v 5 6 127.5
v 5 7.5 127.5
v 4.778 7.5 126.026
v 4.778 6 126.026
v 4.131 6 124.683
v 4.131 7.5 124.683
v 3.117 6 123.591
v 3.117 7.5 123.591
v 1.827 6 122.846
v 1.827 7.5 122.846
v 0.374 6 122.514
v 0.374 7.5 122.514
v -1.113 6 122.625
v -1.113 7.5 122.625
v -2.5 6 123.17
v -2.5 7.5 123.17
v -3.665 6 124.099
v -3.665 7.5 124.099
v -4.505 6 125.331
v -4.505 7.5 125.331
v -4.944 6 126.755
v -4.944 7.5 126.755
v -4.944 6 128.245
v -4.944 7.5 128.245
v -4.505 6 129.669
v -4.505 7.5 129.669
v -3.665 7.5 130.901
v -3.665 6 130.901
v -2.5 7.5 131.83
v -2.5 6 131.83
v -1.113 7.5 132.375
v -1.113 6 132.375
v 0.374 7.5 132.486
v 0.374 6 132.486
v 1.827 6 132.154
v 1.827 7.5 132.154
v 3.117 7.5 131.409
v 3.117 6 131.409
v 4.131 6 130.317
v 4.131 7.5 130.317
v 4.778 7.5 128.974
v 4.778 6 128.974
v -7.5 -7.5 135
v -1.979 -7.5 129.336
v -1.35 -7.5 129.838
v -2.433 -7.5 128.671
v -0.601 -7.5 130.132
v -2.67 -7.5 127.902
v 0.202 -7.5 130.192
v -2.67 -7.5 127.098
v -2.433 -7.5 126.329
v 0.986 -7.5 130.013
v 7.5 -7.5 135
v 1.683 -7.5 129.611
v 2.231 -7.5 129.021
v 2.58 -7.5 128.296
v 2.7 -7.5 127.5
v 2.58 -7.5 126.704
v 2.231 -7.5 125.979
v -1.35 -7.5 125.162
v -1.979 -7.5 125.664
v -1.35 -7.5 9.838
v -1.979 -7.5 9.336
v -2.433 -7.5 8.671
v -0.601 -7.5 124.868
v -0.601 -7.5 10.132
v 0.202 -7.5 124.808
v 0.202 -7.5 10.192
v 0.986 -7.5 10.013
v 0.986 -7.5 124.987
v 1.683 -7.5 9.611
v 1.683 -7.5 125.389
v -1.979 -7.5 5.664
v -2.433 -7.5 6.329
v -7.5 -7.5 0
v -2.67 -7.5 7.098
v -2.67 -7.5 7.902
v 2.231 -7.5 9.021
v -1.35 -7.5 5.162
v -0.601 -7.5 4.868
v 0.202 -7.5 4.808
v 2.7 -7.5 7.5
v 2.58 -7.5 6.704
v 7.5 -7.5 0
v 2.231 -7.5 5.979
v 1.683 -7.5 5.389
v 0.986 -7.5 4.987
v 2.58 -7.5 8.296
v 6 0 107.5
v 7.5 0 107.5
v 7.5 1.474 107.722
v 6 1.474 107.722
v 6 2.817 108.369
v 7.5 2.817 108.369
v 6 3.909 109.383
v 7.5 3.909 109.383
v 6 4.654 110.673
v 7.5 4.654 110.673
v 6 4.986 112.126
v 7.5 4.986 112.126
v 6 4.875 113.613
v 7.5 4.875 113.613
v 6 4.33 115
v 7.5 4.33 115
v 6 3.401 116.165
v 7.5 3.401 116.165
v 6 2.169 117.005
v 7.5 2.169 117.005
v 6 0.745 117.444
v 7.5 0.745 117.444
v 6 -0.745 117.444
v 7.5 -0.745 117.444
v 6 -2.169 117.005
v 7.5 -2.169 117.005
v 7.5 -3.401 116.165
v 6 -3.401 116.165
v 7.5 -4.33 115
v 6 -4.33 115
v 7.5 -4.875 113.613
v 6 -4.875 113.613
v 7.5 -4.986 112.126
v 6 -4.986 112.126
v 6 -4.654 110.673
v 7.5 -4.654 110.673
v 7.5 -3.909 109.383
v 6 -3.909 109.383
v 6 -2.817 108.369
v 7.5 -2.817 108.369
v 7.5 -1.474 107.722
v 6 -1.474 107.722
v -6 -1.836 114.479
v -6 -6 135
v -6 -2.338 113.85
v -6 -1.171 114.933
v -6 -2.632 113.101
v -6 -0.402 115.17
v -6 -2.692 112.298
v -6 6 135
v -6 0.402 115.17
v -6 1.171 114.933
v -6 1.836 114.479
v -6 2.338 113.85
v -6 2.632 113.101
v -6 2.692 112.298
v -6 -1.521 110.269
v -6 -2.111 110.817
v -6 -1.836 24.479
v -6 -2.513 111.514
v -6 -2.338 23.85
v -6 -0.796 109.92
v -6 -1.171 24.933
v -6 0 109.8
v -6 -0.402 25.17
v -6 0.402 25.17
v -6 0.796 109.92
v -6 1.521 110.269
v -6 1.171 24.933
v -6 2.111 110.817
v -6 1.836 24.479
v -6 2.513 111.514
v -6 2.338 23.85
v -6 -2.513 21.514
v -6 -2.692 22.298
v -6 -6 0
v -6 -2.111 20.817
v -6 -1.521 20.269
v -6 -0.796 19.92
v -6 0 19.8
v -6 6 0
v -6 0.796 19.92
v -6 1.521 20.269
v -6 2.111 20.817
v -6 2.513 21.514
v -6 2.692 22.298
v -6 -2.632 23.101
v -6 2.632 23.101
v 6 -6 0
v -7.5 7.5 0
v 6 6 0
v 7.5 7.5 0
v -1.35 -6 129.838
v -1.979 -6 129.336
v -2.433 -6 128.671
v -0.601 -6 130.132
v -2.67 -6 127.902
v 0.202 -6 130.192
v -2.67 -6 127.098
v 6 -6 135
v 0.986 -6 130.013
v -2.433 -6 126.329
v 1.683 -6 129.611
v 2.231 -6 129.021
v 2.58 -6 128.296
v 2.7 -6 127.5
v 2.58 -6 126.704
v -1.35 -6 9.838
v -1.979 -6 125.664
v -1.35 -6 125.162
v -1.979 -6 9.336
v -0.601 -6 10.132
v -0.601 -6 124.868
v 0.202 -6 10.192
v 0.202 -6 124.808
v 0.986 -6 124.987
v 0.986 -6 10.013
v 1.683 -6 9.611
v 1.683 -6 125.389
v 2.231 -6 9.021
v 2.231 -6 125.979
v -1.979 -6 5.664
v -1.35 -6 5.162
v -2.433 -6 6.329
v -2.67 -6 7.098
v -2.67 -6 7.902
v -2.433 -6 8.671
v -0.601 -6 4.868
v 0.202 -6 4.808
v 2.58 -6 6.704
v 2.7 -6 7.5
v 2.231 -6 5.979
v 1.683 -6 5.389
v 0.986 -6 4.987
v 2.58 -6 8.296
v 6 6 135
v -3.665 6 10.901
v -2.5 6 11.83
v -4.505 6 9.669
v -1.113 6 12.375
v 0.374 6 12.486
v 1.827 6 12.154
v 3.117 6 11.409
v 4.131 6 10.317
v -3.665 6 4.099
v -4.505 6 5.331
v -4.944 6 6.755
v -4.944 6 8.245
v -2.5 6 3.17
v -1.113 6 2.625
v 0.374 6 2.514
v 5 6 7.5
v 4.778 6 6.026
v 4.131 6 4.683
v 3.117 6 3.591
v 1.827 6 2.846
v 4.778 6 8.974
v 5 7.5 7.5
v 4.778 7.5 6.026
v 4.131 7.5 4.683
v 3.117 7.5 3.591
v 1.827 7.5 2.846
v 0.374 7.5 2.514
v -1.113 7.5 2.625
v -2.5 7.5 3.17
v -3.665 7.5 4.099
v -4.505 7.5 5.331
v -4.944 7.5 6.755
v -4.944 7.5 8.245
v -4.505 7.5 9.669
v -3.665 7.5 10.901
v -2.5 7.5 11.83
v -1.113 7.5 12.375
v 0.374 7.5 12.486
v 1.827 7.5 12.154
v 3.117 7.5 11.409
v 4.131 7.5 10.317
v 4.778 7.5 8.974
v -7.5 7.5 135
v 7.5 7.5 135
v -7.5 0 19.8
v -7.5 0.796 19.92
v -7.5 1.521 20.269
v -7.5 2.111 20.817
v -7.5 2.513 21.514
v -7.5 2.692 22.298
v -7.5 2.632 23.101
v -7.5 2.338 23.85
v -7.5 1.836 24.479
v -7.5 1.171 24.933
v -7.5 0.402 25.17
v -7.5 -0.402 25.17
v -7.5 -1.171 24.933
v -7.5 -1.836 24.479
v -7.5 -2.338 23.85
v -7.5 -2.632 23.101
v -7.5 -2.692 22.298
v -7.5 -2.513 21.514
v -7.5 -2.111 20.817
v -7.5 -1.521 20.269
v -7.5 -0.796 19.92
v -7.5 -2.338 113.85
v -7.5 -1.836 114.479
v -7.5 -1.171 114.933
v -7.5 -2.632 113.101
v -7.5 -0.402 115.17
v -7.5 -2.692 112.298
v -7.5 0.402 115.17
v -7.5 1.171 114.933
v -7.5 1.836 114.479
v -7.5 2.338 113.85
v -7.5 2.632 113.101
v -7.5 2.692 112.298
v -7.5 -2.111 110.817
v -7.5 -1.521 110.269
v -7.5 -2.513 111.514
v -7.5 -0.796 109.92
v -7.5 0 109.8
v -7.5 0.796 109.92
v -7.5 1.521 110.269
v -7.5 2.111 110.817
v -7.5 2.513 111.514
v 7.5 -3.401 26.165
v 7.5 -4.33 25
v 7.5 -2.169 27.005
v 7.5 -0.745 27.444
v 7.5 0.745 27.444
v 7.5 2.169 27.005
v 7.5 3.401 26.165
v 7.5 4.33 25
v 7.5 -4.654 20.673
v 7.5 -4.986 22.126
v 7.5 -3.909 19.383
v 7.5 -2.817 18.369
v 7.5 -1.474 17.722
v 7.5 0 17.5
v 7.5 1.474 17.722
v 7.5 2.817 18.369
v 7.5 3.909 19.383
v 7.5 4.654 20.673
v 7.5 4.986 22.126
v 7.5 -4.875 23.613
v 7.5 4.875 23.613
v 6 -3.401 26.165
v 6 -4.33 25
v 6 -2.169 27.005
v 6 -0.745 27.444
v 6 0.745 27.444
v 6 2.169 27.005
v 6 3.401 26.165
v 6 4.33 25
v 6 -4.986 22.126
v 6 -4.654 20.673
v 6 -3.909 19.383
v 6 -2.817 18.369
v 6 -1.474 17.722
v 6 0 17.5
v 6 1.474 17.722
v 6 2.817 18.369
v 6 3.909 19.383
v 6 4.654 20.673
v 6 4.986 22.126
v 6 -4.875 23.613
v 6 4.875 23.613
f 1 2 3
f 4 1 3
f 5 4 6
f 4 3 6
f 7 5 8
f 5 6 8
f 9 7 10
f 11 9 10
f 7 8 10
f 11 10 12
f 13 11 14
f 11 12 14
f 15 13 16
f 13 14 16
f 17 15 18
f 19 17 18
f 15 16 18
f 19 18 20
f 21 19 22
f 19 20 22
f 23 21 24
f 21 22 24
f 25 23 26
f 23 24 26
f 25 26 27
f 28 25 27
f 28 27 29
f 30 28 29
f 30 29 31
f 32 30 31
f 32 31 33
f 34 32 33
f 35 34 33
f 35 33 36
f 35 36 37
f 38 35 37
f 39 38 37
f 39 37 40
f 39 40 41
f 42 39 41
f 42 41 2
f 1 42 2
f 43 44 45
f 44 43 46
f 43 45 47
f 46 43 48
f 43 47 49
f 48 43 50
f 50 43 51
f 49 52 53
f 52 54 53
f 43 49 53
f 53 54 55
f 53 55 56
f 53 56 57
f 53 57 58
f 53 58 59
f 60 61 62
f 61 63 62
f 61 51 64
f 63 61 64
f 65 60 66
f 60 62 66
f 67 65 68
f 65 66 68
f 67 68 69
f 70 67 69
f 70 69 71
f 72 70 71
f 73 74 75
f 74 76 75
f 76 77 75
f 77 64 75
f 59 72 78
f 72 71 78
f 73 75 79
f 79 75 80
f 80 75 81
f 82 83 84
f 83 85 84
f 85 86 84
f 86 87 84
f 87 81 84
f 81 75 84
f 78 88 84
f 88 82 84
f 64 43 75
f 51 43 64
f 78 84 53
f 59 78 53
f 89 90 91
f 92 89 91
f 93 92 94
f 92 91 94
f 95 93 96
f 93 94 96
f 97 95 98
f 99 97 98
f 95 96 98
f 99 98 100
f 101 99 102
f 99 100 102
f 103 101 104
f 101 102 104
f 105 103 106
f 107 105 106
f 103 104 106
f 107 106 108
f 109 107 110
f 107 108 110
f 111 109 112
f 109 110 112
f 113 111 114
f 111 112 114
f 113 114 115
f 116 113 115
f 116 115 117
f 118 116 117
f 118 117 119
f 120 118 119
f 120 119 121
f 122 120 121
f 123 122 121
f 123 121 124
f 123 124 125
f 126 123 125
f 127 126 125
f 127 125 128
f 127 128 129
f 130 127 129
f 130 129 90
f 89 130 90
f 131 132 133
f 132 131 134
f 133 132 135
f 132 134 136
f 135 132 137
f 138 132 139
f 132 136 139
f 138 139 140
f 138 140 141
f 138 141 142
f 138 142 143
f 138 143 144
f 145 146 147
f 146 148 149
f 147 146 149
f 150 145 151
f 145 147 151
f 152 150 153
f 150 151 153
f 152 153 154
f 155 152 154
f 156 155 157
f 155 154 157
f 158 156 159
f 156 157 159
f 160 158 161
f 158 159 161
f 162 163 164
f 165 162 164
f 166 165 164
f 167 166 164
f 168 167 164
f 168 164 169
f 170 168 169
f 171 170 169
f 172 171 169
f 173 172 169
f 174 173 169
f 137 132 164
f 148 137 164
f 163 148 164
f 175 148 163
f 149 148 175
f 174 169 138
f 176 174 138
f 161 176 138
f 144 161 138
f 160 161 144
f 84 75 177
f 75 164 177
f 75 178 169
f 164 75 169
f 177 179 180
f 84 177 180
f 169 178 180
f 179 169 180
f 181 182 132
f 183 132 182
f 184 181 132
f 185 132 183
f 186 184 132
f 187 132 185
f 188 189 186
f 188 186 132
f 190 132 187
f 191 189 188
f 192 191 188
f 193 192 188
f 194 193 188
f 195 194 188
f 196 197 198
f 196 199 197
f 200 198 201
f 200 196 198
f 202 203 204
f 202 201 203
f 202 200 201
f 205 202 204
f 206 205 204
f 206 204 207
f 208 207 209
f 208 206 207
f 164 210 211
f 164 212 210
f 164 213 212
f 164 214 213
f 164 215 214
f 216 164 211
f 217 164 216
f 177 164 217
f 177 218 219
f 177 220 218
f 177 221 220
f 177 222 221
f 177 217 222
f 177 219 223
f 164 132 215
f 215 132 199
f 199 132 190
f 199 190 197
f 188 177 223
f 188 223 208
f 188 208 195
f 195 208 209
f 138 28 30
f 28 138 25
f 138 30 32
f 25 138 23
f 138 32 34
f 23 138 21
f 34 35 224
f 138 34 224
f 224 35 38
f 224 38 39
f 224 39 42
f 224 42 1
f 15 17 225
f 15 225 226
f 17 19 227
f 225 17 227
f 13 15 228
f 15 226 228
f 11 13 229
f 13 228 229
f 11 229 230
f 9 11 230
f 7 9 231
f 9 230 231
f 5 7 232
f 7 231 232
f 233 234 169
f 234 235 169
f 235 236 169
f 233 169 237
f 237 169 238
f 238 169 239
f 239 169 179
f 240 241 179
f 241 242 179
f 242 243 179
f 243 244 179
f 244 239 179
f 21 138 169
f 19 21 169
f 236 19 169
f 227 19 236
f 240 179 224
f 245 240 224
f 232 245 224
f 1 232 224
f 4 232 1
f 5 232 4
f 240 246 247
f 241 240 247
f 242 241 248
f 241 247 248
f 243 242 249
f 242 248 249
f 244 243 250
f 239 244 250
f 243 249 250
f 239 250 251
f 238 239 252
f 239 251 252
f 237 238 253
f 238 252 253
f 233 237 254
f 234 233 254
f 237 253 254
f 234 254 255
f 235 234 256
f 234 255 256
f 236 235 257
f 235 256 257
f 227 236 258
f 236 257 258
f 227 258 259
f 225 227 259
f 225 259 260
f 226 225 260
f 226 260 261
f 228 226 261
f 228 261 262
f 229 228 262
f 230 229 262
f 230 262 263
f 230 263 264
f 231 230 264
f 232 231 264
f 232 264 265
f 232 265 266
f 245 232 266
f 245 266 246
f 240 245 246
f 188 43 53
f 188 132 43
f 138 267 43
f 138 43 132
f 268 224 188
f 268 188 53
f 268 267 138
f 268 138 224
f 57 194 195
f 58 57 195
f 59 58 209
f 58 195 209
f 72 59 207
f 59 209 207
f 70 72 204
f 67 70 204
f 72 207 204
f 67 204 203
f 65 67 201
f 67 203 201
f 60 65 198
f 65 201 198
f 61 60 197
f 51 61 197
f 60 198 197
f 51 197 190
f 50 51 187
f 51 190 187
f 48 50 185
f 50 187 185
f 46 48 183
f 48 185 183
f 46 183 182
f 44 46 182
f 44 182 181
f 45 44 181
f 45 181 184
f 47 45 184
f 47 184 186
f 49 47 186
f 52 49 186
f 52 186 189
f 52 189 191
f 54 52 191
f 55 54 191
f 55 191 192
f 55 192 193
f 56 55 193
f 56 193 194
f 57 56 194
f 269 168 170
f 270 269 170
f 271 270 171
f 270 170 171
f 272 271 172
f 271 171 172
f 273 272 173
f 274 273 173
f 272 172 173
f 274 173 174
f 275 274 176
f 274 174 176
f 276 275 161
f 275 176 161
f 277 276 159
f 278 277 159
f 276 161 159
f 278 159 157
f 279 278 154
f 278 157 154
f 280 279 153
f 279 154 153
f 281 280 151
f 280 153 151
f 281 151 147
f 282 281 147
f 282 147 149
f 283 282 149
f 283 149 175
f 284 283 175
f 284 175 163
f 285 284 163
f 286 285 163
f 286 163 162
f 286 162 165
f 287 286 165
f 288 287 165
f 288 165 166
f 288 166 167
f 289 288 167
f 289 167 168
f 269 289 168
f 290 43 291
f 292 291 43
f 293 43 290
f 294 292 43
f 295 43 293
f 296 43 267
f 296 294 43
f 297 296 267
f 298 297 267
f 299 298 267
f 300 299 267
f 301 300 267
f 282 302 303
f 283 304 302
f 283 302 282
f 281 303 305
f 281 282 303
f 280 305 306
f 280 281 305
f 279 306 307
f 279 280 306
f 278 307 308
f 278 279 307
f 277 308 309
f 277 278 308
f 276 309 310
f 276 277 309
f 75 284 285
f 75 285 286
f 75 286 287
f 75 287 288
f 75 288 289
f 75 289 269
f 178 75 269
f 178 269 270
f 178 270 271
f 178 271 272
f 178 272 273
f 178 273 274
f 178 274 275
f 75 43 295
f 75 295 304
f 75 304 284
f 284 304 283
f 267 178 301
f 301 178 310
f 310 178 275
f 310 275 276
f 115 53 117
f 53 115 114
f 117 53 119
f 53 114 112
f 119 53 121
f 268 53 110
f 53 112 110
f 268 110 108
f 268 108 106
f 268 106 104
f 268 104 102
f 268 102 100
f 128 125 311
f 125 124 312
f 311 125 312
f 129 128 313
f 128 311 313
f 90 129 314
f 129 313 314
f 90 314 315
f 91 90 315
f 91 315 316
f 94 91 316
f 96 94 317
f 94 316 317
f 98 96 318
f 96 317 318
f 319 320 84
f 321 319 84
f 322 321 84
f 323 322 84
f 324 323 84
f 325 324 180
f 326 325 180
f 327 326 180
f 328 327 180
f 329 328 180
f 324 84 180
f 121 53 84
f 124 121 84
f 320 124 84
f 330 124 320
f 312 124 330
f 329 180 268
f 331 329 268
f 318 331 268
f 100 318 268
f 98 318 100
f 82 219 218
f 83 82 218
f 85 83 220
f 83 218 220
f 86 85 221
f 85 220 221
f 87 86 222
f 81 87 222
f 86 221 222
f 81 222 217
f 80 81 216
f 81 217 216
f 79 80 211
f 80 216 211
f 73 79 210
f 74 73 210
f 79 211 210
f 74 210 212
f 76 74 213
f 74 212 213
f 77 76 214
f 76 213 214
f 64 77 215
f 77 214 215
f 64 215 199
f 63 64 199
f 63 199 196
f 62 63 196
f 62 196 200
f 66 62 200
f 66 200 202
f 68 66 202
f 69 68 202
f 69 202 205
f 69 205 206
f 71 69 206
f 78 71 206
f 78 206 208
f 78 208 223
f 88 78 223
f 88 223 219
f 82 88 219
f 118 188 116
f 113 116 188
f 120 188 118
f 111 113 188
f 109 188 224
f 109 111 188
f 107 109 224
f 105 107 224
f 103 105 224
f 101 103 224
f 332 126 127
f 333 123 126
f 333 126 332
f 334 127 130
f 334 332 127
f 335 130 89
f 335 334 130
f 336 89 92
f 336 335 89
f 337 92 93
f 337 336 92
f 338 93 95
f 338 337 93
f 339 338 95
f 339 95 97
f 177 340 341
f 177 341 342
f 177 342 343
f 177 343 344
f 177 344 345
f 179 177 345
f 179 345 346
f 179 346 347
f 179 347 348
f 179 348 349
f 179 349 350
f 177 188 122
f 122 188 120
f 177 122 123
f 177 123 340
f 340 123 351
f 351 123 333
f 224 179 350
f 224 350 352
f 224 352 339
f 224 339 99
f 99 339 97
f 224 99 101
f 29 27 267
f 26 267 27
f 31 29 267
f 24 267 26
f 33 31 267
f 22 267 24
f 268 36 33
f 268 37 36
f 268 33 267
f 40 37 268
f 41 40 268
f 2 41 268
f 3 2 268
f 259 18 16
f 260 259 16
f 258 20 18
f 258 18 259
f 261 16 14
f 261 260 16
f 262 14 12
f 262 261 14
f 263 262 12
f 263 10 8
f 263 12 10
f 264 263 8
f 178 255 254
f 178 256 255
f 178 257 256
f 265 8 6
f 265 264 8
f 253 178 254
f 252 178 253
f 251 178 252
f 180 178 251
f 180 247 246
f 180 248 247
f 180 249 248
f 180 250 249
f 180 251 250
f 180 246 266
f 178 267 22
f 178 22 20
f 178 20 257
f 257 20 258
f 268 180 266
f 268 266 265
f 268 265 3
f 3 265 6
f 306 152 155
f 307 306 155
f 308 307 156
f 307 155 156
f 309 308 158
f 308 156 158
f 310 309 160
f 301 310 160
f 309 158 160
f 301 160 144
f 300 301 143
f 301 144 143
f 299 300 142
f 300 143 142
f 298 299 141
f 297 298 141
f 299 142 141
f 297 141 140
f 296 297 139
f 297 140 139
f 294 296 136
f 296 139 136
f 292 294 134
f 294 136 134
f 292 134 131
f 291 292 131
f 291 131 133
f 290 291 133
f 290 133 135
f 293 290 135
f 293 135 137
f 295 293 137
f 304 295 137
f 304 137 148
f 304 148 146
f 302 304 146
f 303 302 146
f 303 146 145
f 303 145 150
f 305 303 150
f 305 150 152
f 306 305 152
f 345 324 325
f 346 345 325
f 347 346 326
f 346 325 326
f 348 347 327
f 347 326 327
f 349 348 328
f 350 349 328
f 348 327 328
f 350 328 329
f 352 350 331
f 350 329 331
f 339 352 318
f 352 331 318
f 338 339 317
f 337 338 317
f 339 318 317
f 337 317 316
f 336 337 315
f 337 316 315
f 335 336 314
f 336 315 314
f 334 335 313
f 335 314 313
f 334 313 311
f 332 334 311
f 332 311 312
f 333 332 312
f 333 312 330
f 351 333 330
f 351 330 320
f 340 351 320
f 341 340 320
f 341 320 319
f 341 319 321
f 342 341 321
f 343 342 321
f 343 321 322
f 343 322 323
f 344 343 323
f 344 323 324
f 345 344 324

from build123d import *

# Parameters (mm, degrees)
SKETCH_1_W          = 15
SKETCH_1_H          = 15
SKETCH_1_W_2        = 12
SKETCH_1_H_2        = 12
EXTRUDE_1_DEPTH     = 135
SKETCH_2_R          = 2.7
CUT_EXTRUDE_1_DEPTH = 25
SKETCH_3_R          = 2.7
CUT_EXTRUDE_2_DEPTH = 25
SKETCH_4_R          = 5
CUT_EXTRUDE_3_DEPTH = 10
SKETCH_5_R          = 5
CUT_EXTRUDE_4_DEPTH = 10


with BuildPart() as part:
    # ｽｹｯﾁ1 → ﾎﾞｽ - 押し出し1 (new body)
    with BuildSketch(Plane.XY):
        Rectangle(SKETCH_1_W, SKETCH_1_H)
        Rectangle(SKETCH_1_W_2, SKETCH_1_H_2, mode=Mode.SUBTRACT)
    extrude(amount=EXTRUDE_1_DEPTH)

    # ｽｹｯﾁ2 → ｶｯﾄ - 押し出し1 (cut)
    with BuildSketch(Plane(origin=(7.5, 0, 0), x_dir=(0, 0, -1), z_dir=(1, 0, 0))):
        with Locations((-112.5, 0)):
            Circle(SKETCH_2_R)
        with Locations((-22.5, 0)):
            Circle(SKETCH_2_R)
    extrude(amount=-CUT_EXTRUDE_1_DEPTH, mode=Mode.SUBTRACT)

    # ｽｹｯﾁ3 → ｶｯﾄ - 押し出し2 (cut)
    with BuildSketch(Plane(origin=(0, 7.5, 0), x_dir=(1, 0, 0), z_dir=(0, 1, 0))):
        with Locations((0, -7.5)):
            Circle(SKETCH_3_R)
        with Locations((0, -127.5)):
            Circle(SKETCH_3_R)
    extrude(amount=-CUT_EXTRUDE_2_DEPTH, mode=Mode.SUBTRACT)

    # ｽｹｯﾁ4 → ｶｯﾄ - 押し出し3 (cut)
    with BuildSketch(Plane(origin=(0, 7.5, 0), x_dir=(1, 0, 0), z_dir=(0, 1, 0))):
        with Locations((0, -127.5)):
            Circle(SKETCH_4_R)
        with Locations((0, -7.5)):
            Circle(SKETCH_4_R)
    extrude(amount=-CUT_EXTRUDE_3_DEPTH, mode=Mode.SUBTRACT)

    # ｽｹｯﾁ5 → ｶｯﾄ - 押し出し4 (cut)
    with BuildSketch(Plane(origin=(7.5, 0, 0), x_dir=(0, 0, -1), z_dir=(1, 0, 0))):
        with Locations((-22.5, 0)):
            Circle(SKETCH_5_R)
        with Locations((-112.5, 0)):
            Circle(SKETCH_5_R)
    extrude(amount=-CUT_EXTRUDE_4_DEPTH, mode=Mode.SUBTRACT)


solid = part.part
